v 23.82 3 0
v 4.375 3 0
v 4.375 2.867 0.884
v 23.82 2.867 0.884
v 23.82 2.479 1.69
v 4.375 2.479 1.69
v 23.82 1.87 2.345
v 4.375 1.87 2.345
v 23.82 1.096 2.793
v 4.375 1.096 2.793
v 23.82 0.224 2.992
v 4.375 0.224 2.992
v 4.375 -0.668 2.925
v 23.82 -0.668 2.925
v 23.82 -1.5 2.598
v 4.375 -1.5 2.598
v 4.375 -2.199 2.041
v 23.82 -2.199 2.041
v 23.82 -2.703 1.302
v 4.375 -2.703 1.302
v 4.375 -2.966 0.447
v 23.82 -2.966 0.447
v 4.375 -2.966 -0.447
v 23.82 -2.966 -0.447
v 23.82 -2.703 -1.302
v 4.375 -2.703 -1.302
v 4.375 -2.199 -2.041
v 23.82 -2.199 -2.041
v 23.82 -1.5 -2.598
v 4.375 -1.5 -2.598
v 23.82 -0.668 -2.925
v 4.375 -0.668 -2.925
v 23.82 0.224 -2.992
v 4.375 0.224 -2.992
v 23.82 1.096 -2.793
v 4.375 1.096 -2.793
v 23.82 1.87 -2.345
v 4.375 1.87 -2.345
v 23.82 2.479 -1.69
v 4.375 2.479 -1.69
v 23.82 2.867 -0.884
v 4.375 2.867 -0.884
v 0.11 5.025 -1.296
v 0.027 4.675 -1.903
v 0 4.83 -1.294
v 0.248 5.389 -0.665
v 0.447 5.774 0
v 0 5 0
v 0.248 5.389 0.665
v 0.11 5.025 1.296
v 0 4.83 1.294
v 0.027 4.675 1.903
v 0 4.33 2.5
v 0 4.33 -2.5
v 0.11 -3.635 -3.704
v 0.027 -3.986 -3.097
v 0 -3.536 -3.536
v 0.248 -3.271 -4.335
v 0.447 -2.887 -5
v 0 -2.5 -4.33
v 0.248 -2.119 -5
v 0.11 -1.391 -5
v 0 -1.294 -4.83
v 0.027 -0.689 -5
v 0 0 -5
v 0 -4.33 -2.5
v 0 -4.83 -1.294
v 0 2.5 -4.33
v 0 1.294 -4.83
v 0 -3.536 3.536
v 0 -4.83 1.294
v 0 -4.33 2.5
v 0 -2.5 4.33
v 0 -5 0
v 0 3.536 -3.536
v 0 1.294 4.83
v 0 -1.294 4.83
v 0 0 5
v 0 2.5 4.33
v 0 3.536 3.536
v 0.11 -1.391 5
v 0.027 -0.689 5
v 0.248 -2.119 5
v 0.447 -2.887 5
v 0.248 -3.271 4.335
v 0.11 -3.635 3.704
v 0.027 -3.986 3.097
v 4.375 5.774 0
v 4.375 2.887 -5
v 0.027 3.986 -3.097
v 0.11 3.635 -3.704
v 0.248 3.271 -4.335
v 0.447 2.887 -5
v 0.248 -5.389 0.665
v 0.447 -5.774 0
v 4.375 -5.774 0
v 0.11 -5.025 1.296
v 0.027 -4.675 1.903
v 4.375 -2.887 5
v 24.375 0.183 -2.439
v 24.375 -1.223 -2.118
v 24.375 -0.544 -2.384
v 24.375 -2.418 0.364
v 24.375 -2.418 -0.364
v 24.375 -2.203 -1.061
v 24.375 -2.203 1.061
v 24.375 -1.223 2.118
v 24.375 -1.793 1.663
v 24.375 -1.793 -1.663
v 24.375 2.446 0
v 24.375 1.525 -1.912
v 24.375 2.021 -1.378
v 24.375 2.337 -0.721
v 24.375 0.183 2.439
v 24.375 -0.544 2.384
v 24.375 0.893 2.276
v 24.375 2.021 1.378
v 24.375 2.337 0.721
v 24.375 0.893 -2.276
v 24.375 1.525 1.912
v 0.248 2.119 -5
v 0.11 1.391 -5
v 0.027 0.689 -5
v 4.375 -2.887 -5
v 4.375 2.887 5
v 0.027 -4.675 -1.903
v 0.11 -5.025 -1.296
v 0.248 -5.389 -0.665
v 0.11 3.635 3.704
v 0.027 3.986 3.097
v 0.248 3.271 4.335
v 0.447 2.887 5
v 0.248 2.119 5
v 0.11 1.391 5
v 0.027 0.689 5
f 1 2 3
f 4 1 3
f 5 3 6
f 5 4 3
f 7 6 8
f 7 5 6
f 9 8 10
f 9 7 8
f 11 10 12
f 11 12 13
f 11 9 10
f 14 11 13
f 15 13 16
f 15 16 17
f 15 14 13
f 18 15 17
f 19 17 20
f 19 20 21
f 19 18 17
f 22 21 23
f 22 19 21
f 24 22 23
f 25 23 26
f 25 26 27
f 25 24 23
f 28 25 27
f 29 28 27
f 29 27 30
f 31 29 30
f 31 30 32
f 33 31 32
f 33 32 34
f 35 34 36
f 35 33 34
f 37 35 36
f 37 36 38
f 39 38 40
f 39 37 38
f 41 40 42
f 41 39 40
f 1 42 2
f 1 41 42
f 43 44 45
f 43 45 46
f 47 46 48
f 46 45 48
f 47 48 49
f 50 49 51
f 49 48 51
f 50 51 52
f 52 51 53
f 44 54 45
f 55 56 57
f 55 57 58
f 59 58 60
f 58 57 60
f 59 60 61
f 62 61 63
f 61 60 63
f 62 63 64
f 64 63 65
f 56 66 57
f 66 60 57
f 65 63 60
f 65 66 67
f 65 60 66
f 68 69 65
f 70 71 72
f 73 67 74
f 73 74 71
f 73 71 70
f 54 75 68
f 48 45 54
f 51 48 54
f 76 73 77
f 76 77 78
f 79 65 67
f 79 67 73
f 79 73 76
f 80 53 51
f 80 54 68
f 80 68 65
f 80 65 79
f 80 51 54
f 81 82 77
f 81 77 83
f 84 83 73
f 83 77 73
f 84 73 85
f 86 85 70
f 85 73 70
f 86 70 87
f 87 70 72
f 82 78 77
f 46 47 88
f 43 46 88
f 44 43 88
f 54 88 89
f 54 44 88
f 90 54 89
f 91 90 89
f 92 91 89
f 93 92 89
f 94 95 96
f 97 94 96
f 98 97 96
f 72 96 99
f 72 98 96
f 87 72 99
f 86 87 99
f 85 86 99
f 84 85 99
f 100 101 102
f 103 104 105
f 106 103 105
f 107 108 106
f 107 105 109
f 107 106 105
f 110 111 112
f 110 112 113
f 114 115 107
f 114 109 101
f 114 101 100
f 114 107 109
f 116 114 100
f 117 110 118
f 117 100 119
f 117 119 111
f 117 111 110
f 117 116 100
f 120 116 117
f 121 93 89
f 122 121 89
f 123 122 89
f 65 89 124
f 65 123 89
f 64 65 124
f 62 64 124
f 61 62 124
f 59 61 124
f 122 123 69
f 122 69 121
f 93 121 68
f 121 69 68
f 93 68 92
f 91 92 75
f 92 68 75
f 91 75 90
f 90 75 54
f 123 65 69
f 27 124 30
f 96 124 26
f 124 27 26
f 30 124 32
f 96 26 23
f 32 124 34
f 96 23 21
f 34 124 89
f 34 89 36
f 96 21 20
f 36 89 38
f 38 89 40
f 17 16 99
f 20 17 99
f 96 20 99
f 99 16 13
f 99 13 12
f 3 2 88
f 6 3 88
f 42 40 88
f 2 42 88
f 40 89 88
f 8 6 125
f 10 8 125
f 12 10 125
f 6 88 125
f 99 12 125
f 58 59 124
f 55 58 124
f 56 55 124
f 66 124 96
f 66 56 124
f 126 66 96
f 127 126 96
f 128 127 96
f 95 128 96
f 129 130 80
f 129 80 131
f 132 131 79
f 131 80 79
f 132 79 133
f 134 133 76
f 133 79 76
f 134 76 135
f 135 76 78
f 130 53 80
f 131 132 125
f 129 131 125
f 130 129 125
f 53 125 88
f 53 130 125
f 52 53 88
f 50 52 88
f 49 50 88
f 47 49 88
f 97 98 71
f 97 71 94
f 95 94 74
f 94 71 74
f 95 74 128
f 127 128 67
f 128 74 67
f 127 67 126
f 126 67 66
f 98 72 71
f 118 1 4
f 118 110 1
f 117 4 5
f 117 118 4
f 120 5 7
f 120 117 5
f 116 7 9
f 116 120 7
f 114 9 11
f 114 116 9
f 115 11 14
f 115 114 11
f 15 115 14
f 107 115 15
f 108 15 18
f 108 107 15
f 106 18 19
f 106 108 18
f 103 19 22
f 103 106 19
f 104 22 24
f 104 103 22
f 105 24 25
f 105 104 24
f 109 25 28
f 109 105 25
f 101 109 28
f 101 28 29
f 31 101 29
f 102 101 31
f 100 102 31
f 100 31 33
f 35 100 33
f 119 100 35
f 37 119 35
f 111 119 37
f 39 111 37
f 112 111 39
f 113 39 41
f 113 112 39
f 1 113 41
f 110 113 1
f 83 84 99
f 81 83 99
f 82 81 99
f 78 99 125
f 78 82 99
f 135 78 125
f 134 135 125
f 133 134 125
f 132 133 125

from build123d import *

# Parameters (mm, degrees)
BASEHEAD_DEPTH = 4.375


# Read off the part's stored shape, not the designer's step: HeadChamfer
with BuildPart() as part:
    # Sketch1 → BaseHead (new body)
    with BuildSketch(Plane(origin=(0, 0, 0), x_dir=(0, 0, -1), z_dir=(1, 0, 0))):
        Polygon((5, 2.886751346), (5, -2.886751346), (0, -5.773502692), (-5, -2.886751346), (-5, 2.886751346), (0, 5.773502692), align=None)
    extrude(amount=BASEHEAD_DEPTH)

    # HeadChamfer outline → HeadChamfer (revolve, cut)
    with BuildSketch(Plane.YX):
        Polygon((5.773502688, 0.446581985), (4.999998827, -6.77e-07), (5.773502692, -8.45e-07), align=None)
    revolve(axis=Axis((0, 0, 0), (1, 0, 0)), mode=Mode.SUBTRACT)

    # HeadChamfer 2 outline → HeadChamfer 2 (revolve)
    with BuildSketch(Plane.YX):
        Polygon((3, 4.375), (3, 23.8205), (2.4455, 24.375), (0, 24.375), (0, 4.375), align=None)
    revolve(axis=Axis((0, 0, 0), (1, 0, 0)))


solid = part.part
